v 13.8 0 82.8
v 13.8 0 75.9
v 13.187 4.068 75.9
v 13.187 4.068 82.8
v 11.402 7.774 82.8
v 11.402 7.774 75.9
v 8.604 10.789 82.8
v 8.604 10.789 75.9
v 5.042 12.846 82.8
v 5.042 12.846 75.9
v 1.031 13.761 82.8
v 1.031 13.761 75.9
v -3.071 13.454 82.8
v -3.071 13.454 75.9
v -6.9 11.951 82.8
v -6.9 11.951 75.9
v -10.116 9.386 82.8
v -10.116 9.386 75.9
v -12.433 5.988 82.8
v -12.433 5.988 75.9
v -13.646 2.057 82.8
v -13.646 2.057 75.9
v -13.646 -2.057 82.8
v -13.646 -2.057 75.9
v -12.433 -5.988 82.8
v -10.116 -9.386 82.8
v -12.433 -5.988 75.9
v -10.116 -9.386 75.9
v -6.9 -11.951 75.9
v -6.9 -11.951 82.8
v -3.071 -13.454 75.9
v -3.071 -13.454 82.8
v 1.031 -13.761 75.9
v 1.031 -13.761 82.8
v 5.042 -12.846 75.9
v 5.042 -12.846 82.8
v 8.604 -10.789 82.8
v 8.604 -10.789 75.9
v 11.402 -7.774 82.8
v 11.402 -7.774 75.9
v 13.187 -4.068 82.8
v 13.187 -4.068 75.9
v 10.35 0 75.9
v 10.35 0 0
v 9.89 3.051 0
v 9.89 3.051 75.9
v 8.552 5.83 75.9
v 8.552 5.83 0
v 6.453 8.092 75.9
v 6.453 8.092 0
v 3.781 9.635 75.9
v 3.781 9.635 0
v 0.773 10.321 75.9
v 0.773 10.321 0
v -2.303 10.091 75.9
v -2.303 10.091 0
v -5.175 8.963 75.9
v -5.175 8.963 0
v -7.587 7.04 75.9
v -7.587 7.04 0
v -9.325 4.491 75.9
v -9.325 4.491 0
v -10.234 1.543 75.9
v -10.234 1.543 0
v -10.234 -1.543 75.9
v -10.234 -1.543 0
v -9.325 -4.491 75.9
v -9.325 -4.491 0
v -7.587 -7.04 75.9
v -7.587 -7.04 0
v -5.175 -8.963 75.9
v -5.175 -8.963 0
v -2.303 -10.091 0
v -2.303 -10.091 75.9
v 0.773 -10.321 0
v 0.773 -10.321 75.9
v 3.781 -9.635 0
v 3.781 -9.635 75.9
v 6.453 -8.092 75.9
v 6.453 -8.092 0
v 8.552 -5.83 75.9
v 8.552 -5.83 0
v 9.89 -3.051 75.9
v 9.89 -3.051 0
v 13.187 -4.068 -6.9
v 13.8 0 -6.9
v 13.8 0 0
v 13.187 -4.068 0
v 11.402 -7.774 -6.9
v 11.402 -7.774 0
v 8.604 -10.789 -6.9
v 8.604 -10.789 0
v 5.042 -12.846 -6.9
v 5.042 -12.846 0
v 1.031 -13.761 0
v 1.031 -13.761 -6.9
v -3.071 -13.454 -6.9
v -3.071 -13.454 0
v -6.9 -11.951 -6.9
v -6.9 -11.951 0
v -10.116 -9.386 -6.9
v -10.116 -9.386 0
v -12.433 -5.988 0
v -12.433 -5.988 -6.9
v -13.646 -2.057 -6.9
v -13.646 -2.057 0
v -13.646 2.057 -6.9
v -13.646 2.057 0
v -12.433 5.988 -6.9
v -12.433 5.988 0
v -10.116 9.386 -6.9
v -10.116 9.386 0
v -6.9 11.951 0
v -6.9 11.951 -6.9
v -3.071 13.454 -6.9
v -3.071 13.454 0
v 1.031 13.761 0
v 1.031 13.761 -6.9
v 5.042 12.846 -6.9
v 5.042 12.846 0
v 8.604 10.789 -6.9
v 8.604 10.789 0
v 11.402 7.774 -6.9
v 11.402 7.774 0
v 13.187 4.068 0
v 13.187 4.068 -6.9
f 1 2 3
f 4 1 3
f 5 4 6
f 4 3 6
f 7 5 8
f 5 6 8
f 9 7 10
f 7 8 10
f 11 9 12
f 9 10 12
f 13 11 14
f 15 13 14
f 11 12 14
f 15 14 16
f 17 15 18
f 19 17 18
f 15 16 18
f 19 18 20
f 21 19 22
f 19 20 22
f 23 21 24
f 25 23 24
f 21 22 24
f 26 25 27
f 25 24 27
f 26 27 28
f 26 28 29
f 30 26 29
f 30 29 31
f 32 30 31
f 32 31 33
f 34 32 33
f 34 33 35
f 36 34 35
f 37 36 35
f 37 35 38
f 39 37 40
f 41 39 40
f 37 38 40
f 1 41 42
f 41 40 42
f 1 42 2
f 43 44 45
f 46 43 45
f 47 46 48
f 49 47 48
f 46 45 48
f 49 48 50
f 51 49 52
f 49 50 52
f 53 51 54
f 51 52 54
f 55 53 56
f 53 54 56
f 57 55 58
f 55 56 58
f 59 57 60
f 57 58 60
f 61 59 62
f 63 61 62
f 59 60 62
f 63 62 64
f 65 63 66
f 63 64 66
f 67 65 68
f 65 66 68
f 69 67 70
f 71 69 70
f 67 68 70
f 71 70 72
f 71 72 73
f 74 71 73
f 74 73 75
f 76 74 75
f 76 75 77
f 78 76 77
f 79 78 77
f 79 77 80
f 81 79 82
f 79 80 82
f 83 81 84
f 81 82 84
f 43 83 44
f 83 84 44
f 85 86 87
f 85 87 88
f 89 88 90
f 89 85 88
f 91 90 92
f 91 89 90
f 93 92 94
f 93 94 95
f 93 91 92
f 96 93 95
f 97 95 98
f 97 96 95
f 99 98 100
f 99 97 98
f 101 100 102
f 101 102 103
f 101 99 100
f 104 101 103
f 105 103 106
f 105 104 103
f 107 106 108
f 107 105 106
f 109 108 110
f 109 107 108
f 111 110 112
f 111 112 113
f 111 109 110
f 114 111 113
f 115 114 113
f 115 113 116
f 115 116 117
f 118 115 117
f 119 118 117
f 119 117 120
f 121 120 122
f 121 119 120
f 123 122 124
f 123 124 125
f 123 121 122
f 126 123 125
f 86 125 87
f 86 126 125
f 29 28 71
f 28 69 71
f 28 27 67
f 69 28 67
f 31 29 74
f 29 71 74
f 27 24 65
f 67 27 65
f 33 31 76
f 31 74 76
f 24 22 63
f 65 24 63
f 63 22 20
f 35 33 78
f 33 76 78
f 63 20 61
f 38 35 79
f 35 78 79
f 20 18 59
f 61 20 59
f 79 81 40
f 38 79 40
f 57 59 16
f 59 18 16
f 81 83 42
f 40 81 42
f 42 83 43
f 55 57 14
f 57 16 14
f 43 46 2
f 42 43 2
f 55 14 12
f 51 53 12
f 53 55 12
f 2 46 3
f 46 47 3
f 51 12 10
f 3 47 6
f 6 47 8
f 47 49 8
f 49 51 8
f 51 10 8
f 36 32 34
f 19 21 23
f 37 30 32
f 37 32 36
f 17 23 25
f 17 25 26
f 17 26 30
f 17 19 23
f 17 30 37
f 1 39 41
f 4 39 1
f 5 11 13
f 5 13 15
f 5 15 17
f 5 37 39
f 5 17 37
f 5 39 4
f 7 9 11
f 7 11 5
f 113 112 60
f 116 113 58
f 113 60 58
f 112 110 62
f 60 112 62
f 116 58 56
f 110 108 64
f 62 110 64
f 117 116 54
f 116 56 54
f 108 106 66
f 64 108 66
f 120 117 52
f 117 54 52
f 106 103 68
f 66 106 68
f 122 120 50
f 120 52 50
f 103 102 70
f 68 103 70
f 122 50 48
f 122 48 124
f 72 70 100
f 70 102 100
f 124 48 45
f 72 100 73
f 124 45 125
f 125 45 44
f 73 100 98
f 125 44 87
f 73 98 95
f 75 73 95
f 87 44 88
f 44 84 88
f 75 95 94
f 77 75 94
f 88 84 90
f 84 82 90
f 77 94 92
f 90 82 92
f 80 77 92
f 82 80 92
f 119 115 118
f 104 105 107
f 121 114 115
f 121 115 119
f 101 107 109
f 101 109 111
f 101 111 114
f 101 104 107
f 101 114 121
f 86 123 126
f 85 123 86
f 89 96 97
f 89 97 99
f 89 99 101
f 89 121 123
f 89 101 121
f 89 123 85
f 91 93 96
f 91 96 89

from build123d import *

# Parameters (mm, degrees)
SKETCH_1_R      = 30
EXTRUDE_1_DEPTH = 220
SKETCH_2_R      = 40
EXTRUDE_2_DEPTH = 20
EXTRUDE_START   = 20
SKETCH_3_R      = 40
EXTRUDE_3_DEPTH = 20
SCALE_1_SCALE   = 0.345


with BuildPart() as part:
    # 草图1 → 凸台-拉伸1 (new body)
    with BuildSketch(Plane.XY):
        Circle(SKETCH_1_R)
    extrude(amount=EXTRUDE_1_DEPTH)

    # 草图2 → 凸台-拉伸2 (add)
    with BuildSketch(Plane.XY.offset(220)):
        Circle(SKETCH_2_R)
    extrude(amount=EXTRUDE_2_DEPTH)

    # 草图3 → 凸台-拉伸3 (add)
    with BuildSketch(Plane(origin=(0, 0, 0), x_dir=(-1, 0, 0), z_dir=(0, 0, -1)).offset(EXTRUDE_START)):
        with Locations(Location((0, 0, 0), (0, 0, 180))):
            Circle(SKETCH_3_R)
    extrude(amount=-EXTRUDE_3_DEPTH)


with BuildPart() as part_1:
    # 缩放比例1: scaled about (0, 0, 0)
    add(part.part.scale(SCALE_1_SCALE))


solid = part_1.part
